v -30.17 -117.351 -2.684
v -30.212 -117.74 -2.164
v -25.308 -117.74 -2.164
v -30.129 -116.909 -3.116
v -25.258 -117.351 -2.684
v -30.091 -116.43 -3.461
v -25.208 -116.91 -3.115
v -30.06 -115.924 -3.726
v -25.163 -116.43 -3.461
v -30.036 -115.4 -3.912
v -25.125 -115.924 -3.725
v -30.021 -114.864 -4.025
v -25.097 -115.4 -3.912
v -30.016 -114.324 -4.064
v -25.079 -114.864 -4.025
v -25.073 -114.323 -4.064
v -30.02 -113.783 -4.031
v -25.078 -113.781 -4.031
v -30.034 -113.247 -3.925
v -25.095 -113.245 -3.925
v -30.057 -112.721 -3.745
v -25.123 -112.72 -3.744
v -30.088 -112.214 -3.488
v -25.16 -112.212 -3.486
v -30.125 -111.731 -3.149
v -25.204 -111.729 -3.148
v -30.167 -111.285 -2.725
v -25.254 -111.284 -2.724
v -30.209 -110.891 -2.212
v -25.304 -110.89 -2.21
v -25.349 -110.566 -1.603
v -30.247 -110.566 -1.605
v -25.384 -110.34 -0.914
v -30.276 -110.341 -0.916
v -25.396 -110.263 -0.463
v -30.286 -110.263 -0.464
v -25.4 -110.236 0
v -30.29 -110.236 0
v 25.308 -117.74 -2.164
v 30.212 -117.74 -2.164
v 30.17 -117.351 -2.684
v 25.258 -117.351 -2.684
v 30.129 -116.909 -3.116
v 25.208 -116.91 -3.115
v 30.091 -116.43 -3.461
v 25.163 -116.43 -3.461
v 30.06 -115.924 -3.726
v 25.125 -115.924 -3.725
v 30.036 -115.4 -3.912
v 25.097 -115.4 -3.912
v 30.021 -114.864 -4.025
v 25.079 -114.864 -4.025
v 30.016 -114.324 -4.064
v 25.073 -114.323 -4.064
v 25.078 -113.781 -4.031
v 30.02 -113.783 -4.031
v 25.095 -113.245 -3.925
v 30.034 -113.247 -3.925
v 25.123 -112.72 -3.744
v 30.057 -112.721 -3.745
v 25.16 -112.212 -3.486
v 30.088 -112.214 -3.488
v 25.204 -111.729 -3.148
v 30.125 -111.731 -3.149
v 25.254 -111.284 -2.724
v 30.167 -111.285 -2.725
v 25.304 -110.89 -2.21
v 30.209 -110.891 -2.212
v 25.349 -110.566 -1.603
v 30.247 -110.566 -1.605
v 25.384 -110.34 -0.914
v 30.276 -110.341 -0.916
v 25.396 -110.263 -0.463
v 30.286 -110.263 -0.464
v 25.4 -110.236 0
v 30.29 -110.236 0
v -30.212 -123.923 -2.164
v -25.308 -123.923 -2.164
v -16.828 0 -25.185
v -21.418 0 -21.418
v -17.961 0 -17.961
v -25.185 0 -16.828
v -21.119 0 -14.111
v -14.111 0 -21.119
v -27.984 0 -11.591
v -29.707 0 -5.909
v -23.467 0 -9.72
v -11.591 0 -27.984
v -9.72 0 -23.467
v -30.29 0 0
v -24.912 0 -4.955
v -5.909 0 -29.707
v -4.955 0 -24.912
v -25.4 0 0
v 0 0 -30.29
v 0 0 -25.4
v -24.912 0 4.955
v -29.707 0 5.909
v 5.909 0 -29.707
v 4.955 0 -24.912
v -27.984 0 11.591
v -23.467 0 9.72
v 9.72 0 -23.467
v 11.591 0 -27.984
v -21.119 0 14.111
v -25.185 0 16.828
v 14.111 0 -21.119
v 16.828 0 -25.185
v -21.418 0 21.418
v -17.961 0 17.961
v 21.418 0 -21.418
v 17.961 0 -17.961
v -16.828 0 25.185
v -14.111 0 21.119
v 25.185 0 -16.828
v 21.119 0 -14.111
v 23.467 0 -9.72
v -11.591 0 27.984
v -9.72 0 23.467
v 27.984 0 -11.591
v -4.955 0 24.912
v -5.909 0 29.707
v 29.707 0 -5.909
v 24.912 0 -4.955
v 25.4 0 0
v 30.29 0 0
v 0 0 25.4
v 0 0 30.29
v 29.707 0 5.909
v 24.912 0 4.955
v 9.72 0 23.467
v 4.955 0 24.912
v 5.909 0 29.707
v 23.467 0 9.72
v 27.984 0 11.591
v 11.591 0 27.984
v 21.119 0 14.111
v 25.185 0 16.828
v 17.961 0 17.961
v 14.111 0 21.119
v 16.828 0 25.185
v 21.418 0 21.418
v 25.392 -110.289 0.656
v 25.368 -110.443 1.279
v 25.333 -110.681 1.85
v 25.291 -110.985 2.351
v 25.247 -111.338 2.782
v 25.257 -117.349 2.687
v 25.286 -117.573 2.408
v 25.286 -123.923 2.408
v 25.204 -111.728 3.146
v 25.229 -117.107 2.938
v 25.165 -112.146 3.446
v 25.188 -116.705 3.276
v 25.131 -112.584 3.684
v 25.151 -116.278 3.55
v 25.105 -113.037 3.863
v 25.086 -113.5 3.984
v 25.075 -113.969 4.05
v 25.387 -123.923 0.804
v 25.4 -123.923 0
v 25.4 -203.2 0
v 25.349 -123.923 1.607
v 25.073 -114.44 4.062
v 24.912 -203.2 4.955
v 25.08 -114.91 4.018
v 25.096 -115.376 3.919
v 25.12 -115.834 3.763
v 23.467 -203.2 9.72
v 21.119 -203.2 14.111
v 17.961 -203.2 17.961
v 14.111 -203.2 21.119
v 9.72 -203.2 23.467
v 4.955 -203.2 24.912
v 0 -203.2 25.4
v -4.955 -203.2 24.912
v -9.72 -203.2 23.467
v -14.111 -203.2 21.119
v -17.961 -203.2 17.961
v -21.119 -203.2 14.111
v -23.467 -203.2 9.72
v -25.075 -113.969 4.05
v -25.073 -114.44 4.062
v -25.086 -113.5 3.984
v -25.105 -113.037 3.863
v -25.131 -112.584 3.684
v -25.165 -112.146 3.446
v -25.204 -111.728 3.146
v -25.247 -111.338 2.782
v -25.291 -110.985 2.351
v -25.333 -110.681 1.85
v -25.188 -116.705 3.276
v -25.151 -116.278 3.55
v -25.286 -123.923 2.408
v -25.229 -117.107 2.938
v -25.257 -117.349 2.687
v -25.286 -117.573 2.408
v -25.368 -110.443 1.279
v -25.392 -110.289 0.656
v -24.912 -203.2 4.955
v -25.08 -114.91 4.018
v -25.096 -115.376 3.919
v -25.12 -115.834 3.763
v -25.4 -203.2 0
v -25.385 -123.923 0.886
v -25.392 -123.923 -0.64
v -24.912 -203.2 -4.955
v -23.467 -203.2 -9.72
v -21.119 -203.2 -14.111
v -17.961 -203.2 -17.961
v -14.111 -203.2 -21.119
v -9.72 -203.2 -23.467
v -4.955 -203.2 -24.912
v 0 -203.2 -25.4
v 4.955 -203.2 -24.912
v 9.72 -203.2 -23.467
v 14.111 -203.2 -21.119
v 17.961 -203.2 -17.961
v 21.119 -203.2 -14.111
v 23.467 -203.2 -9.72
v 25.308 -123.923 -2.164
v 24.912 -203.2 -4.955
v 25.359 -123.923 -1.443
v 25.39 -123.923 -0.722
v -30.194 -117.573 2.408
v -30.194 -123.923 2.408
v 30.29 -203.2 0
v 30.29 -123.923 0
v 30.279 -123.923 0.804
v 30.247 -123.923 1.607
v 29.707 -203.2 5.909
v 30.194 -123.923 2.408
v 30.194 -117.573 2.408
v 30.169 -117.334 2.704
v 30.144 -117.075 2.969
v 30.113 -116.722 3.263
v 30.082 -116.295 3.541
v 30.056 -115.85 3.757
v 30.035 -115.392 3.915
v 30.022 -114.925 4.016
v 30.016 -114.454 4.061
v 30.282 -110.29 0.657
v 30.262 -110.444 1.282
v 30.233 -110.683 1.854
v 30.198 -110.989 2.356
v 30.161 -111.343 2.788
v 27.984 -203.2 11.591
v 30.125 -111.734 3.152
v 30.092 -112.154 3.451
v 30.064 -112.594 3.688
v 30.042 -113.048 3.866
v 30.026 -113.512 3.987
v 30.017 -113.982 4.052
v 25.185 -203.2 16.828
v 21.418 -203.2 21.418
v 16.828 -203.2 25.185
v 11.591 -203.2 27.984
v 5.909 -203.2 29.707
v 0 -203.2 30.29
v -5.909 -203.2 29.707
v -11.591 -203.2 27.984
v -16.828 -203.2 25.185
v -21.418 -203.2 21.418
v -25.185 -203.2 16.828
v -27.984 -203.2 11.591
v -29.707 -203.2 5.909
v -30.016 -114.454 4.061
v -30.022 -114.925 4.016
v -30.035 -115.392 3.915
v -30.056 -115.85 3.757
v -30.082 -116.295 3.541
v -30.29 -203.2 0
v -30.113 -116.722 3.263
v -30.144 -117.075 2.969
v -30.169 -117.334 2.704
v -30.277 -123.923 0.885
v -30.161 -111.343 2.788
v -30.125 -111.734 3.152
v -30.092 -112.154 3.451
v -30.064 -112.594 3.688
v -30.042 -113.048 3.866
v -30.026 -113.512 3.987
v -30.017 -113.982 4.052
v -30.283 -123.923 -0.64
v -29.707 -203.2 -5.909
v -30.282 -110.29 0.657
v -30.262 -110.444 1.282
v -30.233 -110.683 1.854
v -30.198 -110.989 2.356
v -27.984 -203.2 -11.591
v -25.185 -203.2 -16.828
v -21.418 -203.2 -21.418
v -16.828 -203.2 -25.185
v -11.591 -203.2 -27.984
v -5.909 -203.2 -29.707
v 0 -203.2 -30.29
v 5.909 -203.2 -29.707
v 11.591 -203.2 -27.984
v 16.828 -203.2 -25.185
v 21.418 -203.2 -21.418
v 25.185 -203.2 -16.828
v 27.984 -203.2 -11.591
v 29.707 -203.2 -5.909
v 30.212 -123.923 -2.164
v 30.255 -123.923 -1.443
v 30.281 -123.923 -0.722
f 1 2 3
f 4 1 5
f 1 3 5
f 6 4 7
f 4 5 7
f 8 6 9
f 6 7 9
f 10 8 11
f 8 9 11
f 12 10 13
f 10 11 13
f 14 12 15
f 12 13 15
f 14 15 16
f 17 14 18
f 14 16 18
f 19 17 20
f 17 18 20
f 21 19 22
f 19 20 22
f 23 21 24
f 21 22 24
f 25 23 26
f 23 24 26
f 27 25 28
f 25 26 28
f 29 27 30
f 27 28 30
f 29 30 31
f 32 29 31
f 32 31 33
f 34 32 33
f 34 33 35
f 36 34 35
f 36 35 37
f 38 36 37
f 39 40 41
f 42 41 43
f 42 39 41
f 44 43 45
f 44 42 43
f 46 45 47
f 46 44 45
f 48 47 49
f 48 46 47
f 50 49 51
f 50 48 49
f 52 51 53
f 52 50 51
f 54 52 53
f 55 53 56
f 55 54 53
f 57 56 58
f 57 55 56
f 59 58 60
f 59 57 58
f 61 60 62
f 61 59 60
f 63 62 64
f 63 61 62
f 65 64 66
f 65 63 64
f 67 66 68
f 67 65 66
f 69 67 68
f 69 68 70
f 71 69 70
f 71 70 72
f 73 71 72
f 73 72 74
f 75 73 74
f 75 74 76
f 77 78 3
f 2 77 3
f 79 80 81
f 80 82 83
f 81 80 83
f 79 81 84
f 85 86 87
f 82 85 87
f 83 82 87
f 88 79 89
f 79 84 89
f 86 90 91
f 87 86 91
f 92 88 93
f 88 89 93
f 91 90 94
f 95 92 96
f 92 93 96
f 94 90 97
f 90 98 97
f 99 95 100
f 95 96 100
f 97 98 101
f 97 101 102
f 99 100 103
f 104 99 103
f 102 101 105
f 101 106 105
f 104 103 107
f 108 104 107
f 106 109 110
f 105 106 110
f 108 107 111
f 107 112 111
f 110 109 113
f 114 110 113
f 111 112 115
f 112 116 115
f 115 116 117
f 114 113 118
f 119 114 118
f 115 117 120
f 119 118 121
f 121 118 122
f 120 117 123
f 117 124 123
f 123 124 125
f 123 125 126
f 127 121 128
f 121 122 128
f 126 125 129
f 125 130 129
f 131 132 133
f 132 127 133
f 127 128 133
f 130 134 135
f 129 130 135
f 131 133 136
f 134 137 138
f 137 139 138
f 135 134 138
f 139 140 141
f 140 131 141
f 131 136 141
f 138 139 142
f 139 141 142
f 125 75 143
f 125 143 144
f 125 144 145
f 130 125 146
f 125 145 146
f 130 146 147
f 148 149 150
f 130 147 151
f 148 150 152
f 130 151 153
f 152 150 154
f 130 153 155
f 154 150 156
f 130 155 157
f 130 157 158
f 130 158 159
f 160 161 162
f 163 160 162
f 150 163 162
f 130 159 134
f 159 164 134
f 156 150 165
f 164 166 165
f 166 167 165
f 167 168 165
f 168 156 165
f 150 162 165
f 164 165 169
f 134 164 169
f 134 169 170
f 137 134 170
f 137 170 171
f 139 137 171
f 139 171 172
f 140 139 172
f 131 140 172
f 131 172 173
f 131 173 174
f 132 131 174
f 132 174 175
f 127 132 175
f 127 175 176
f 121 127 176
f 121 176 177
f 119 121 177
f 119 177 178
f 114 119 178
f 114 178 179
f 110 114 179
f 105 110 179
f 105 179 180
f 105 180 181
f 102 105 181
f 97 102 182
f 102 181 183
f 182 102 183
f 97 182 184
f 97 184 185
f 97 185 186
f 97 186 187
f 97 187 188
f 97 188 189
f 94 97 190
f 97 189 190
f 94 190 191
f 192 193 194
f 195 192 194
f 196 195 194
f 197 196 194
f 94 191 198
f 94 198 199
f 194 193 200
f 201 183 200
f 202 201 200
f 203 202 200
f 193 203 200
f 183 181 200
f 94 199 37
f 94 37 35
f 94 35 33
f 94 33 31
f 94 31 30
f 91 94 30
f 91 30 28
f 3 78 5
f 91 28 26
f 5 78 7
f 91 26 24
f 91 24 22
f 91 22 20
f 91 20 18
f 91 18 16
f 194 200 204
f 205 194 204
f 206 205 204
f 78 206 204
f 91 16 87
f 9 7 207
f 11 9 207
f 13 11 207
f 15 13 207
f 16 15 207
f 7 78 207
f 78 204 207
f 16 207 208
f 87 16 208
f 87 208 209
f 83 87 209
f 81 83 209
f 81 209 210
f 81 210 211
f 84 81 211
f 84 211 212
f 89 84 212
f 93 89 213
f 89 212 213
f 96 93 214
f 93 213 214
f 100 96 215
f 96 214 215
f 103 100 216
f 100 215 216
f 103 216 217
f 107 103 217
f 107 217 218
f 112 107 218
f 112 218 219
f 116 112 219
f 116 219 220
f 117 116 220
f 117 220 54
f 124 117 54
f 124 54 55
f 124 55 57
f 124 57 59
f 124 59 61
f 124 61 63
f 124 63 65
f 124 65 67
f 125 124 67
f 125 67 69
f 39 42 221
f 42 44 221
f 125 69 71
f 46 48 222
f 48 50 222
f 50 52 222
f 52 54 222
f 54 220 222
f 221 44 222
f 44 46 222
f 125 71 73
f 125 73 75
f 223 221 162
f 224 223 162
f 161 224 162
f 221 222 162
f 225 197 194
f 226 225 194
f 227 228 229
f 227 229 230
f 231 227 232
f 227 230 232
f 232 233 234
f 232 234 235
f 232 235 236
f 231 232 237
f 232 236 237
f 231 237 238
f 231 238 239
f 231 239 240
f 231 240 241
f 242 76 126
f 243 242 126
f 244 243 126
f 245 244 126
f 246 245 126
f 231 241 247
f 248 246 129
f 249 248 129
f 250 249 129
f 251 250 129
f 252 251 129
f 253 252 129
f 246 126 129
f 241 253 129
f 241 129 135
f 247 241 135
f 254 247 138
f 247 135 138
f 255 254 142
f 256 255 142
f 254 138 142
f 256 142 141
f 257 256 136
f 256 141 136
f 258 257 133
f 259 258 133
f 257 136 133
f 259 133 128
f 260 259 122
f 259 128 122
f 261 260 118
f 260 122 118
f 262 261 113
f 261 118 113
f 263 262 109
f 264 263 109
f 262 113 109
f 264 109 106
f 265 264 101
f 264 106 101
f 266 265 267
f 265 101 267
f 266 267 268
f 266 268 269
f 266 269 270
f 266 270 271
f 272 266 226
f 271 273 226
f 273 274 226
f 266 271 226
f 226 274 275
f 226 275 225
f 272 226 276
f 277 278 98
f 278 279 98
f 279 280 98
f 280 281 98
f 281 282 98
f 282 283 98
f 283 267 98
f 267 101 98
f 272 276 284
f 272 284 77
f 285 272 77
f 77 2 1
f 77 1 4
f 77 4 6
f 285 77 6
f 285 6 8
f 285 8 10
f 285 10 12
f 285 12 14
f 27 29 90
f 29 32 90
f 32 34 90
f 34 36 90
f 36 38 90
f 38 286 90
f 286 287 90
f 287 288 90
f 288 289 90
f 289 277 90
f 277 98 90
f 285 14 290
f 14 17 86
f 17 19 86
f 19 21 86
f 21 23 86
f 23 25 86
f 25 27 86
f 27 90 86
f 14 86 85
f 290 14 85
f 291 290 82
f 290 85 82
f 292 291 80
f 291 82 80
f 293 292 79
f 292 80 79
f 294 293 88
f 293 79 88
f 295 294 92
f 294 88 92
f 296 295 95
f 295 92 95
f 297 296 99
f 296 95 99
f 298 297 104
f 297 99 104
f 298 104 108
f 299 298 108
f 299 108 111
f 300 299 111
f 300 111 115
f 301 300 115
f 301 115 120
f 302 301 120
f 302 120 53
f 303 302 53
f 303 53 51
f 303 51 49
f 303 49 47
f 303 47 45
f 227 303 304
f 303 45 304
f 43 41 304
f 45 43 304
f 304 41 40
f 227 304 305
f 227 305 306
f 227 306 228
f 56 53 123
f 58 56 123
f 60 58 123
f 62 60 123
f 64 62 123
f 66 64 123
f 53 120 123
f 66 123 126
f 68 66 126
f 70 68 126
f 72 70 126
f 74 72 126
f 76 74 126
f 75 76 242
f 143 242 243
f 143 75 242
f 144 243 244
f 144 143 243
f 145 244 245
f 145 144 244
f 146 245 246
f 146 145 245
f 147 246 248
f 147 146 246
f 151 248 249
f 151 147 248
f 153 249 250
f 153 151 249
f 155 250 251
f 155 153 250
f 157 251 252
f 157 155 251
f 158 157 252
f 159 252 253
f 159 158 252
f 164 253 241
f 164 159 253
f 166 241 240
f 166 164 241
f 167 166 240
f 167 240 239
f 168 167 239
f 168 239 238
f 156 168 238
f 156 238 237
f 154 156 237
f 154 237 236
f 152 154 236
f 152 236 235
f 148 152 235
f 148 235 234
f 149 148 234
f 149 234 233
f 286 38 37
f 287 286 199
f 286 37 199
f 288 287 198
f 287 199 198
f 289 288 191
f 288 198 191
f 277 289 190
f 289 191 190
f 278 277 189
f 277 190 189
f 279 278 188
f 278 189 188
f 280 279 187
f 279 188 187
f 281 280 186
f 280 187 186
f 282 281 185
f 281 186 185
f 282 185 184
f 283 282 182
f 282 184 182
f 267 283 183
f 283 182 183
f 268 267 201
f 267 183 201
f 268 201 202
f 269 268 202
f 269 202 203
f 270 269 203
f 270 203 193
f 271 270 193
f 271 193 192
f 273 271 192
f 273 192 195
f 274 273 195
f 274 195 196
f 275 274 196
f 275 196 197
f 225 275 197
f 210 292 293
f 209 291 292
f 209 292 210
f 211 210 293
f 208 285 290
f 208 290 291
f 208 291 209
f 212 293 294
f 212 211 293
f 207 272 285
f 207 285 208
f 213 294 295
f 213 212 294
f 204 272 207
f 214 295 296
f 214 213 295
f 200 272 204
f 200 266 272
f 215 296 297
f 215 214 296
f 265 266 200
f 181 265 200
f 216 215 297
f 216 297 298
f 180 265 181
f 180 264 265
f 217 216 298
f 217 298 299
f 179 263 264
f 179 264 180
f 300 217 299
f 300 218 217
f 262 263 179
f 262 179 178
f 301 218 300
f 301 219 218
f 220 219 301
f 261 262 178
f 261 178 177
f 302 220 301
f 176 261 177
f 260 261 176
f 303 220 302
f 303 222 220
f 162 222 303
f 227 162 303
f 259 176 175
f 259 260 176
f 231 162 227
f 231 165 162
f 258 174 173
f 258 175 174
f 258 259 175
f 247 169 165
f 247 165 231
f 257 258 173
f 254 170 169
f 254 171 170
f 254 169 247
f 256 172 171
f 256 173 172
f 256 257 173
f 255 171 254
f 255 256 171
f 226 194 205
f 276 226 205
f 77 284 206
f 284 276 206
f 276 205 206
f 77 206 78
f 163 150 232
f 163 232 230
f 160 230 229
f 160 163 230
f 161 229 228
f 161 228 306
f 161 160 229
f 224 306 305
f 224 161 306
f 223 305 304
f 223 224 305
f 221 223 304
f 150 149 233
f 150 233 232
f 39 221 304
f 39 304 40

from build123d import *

# Parameters (mm, degrees)
F0_R          = 30.2895
F1_DEPTH      = 203.2
F2_R          = 25.4
F3_DEPTH      = 203.201
F5_DEPTH      = 30.2905
F5_DEPTH_BACK = 30.2905


with BuildPart() as f1:
    # F0 (on Front) → F1 (new body)
    with BuildSketch(Plane.XZ):
        Circle(F0_R)
    extrude(amount=F1_DEPTH)

    # F2 (on face) → F3 (cut, through all)
    with BuildSketch(Plane.XZ.offset(203.2)):
        Circle(F2_R)
    extrude(amount=-F3_DEPTH, mode=Mode.SUBTRACT)

    # F4 (on Right) → F5 (cut, two sides)
    with BuildSketch(Plane.YZ) as f5_sk:
        with BuildLine():
            ThreePointArc((-117.7401898741, -2.1636057012), (-113.1741304801, -3.904934548), (-110.236, 0))
            ThreePointArc((-110.236, 0), (-113.0325941755, 3.8613182304), (-117.5734894076, 2.4083942988))
            Line((-117.5734894076, 2.4083942988), (-117.5734894076, -2.1636057012))
            Line((-117.5734894076, -2.1636057012), (-117.7401898741, -2.1636057012))
        make_face()
        with BuildLine():
            Line((-117.5734894076, -2.1636057012), (-117.5734894076, 2.4083942988))
            ThreePointArc((-117.5734894076, 2.4083942988), (-118.3613013154, 0.1480797953), (-117.7401898741, -2.1636057012))
            Line((-117.7401898741, -2.1636057012), (-117.5734894076, -2.1636057012))
        make_face()
        with BuildLine():
            ThreePointArc((-117.7401898741, -2.1636057012), (-118.3613013154, 0.1480797953), (-117.5734894076, 2.4083942988))
            Line((-117.5734894076, 2.4083942988), (-123.9234894076, 2.4083942988))
            Line((-123.9234894076, 2.4083942988), (-123.9234894076, -2.1636057012))
            Line((-123.9234894076, -2.1636057012), (-117.7401898741, -2.1636057012))
        make_face()
    extrude(amount=-F5_DEPTH, mode=Mode.SUBTRACT)
    extrude(f5_sk.sketch, amount=F5_DEPTH_BACK, mode=Mode.SUBTRACT)


solid = f1.part
